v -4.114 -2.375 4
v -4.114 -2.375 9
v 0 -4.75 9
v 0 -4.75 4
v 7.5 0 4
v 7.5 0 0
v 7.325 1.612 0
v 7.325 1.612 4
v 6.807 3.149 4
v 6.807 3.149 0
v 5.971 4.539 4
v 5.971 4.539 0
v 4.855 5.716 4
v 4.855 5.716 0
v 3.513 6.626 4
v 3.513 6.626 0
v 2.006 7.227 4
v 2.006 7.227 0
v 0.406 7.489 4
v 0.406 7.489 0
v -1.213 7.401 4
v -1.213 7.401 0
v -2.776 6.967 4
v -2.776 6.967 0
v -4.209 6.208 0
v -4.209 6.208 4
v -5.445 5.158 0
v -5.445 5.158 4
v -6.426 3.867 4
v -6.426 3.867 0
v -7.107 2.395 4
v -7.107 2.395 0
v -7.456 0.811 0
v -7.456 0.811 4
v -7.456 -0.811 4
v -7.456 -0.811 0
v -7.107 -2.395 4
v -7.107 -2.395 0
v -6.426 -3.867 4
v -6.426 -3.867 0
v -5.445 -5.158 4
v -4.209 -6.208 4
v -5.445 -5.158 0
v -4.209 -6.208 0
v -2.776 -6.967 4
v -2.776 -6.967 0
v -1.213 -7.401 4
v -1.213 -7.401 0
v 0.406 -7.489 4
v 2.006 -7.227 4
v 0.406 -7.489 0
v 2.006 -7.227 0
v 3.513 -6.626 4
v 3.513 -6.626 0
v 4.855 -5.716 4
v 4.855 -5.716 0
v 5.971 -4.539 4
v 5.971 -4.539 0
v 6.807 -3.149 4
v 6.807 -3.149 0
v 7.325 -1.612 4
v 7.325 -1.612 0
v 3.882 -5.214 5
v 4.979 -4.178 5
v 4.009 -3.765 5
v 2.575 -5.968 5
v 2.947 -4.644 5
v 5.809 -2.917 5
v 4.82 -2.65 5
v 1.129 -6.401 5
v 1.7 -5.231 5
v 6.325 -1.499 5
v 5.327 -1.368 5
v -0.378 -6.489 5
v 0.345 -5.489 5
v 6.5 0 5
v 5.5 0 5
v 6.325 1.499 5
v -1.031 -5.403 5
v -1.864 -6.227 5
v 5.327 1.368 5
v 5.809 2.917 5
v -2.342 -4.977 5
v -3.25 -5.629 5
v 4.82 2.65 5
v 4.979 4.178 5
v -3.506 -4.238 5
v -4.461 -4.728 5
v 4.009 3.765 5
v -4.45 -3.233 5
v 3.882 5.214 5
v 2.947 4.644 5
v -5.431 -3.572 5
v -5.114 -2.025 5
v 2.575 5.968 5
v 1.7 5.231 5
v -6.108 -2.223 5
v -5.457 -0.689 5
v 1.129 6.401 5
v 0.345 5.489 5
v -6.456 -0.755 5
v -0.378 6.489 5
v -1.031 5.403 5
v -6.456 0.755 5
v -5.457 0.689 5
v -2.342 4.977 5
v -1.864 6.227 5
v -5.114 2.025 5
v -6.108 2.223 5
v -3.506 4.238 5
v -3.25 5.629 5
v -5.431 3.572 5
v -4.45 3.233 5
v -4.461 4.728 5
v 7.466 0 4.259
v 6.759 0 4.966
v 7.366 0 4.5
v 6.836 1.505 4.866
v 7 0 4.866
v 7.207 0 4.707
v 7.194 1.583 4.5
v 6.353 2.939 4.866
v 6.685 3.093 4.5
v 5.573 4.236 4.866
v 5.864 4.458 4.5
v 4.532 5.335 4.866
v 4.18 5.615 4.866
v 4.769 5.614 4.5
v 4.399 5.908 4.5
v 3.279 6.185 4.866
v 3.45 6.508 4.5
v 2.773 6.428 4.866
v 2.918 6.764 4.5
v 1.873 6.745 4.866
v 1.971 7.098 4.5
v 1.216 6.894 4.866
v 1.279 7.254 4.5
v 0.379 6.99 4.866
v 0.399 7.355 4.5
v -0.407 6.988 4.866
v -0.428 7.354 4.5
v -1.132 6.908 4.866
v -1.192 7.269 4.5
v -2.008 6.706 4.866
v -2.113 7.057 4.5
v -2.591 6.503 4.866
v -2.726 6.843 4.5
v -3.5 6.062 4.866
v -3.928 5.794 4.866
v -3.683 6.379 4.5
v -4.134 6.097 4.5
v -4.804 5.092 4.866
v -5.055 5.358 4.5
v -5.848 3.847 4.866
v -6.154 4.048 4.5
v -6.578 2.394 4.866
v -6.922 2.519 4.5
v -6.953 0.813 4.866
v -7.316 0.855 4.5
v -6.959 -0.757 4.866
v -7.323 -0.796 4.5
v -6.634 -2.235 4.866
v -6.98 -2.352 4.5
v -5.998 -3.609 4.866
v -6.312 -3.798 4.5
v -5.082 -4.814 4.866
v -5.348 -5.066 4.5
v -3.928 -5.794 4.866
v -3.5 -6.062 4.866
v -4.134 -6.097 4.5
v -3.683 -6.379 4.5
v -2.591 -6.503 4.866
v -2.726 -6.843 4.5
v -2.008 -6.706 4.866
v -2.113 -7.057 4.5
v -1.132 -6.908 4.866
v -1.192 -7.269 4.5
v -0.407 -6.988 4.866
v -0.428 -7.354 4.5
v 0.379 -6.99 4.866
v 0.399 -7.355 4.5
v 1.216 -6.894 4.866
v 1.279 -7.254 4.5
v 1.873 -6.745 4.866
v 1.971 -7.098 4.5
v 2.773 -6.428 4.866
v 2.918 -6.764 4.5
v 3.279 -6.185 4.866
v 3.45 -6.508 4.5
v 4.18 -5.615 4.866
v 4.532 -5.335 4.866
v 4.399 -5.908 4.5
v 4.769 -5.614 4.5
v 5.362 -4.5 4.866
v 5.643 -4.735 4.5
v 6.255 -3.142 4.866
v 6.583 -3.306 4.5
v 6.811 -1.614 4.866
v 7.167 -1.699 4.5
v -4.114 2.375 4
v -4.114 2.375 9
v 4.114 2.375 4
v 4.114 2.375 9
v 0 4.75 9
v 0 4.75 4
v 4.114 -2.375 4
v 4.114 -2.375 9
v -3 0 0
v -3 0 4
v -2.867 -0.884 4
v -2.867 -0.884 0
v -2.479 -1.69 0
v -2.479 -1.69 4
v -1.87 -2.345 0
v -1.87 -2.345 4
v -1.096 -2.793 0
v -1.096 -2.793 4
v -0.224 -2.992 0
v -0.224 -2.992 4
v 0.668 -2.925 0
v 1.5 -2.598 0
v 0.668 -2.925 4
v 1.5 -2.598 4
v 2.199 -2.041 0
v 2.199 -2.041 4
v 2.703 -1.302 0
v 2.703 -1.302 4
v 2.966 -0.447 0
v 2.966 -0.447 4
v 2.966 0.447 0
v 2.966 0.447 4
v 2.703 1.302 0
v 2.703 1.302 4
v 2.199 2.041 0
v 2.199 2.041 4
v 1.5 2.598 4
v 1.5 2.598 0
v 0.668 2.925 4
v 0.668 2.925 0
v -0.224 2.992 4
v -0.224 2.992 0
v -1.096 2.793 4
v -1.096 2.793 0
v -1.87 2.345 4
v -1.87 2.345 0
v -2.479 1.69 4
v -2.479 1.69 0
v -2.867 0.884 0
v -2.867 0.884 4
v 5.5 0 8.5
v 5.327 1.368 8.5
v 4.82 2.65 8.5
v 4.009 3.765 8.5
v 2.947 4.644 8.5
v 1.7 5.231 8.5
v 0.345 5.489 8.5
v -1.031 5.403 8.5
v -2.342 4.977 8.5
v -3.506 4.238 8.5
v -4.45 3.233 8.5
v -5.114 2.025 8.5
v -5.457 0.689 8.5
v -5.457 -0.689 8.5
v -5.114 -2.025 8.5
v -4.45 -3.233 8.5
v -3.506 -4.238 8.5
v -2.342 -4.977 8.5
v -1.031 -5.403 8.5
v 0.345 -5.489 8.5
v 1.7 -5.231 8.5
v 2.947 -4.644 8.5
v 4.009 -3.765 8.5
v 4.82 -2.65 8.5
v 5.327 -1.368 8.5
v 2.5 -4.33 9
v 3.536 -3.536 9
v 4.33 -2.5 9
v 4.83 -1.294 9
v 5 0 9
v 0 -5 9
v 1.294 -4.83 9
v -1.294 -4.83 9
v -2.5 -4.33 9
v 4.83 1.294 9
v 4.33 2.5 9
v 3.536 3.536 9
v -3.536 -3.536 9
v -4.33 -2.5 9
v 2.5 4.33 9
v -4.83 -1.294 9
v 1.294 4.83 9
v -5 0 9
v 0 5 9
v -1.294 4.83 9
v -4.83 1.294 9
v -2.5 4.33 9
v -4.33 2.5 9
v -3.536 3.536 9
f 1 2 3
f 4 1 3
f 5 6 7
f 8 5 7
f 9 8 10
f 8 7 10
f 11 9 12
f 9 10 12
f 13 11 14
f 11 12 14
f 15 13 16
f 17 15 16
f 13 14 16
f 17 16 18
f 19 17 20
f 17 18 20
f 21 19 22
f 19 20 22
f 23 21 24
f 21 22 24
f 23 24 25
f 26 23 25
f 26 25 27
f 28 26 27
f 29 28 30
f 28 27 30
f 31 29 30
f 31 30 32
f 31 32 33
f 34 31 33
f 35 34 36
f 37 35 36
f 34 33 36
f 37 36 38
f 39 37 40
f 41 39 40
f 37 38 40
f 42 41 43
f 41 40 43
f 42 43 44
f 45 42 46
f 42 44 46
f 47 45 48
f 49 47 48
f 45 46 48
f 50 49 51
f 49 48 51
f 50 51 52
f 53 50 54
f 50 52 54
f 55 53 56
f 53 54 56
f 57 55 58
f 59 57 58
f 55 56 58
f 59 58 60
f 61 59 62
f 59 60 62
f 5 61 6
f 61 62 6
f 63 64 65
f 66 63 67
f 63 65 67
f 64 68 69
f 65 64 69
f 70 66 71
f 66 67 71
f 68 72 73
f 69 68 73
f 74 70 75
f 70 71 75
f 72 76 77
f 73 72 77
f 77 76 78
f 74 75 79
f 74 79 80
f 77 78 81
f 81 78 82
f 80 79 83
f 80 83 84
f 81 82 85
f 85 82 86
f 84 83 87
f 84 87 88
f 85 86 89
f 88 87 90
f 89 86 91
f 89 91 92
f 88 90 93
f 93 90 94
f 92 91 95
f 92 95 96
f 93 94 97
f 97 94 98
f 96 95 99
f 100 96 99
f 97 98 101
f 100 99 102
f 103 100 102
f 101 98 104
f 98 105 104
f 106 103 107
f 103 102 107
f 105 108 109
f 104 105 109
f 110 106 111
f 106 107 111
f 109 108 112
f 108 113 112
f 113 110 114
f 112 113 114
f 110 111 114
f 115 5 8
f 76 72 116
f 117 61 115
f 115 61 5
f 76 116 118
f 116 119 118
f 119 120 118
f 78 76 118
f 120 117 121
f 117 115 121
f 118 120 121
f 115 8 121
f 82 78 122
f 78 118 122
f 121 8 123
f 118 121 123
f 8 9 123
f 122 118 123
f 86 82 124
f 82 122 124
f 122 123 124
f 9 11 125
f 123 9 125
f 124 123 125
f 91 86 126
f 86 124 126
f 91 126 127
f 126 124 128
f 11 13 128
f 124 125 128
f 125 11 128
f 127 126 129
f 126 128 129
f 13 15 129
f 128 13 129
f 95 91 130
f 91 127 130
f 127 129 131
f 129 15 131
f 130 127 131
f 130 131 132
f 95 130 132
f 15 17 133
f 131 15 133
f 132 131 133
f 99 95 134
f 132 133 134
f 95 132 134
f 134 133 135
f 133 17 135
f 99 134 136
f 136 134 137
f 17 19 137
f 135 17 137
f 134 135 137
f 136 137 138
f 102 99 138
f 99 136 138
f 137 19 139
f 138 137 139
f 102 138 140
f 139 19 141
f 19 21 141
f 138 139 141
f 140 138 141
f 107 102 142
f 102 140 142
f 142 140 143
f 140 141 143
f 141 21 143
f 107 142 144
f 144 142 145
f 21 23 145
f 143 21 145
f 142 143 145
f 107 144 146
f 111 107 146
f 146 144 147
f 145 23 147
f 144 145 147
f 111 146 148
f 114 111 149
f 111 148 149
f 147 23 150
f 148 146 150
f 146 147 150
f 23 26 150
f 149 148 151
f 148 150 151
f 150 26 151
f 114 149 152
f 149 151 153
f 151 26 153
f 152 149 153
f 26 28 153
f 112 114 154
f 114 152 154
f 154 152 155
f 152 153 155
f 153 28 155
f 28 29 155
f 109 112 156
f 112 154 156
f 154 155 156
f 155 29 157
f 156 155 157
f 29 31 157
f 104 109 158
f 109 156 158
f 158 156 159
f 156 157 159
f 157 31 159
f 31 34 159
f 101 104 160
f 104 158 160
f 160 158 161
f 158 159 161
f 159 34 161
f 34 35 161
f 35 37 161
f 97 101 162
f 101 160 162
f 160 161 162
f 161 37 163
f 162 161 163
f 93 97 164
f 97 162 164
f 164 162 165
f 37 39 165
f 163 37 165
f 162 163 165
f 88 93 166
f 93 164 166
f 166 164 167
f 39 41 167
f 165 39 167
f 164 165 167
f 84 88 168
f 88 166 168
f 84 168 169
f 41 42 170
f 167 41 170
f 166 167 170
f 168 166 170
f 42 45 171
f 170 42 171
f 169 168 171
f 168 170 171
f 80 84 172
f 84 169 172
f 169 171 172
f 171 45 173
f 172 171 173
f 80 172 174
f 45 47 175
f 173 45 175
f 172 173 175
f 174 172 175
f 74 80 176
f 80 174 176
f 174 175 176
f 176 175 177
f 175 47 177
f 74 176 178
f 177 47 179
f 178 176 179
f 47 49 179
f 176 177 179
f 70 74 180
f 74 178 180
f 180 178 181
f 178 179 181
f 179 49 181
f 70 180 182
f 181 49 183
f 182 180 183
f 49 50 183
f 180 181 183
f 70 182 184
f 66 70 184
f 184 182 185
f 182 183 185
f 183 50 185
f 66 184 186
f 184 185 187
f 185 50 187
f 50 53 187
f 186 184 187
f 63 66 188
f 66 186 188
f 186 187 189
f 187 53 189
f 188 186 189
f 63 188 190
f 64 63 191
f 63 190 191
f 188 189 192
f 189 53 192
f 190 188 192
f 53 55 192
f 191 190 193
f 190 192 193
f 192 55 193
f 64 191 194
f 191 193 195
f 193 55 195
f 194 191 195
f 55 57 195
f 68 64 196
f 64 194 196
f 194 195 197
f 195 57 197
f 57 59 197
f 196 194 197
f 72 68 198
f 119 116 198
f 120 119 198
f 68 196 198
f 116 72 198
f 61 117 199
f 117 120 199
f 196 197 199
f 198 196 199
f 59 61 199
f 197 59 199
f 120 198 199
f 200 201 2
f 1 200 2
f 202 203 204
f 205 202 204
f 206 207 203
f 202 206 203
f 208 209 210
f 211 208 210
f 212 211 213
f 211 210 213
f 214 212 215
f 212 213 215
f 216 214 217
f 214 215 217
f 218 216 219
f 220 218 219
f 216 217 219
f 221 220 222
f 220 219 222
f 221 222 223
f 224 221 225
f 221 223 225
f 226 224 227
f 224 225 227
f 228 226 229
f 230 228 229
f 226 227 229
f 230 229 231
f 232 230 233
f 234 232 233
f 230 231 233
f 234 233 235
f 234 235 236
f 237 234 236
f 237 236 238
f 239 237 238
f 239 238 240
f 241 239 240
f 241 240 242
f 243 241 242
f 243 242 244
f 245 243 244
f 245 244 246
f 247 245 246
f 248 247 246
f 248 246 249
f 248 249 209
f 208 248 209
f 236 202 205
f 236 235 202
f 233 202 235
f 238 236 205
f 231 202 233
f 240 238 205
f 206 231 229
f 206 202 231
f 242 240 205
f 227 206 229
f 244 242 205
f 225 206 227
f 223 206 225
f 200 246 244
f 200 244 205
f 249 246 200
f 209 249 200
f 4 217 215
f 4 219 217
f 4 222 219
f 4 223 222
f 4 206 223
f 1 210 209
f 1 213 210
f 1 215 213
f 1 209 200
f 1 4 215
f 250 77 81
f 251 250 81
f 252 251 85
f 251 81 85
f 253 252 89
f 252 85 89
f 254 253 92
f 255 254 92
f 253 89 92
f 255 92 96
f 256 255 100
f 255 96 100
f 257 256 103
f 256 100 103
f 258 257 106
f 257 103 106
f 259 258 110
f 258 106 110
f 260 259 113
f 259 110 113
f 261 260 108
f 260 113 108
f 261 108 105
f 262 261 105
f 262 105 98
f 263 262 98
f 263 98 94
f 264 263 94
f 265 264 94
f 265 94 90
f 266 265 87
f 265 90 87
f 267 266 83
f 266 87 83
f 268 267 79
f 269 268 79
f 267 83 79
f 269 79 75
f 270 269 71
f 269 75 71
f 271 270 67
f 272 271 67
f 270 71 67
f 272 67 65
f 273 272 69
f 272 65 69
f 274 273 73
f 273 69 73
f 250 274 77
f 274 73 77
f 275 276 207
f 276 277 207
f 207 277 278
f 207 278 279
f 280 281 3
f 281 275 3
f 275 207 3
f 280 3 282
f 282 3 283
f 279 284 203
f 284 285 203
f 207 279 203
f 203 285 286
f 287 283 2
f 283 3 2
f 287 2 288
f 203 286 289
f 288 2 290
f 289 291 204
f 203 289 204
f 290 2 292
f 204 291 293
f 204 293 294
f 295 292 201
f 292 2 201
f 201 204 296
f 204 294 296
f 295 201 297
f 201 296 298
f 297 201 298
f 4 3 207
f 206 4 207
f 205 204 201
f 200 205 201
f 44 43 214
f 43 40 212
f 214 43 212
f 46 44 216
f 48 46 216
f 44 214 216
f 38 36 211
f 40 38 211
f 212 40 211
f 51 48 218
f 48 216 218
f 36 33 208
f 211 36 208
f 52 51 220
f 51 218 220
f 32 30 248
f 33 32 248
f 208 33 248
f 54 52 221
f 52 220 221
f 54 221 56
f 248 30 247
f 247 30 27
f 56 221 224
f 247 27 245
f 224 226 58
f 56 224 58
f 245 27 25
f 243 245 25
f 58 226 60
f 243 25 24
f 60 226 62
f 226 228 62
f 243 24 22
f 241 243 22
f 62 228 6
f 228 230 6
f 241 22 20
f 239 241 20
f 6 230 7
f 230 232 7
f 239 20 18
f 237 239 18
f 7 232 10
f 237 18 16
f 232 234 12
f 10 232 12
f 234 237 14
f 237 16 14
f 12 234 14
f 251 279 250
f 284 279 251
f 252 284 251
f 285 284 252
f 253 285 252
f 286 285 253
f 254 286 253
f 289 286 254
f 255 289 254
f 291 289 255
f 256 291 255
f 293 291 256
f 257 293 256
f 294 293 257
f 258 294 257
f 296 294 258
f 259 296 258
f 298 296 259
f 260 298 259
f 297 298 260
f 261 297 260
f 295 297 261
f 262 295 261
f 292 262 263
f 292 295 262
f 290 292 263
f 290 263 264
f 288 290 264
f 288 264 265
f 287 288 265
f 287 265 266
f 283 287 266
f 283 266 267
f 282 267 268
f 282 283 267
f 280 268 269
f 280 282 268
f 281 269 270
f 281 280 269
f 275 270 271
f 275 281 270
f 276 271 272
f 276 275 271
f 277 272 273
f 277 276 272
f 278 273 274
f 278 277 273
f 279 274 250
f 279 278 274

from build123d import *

# Parameters (mm, degrees)
SKETCH001_R     = 3
POCKET_DEPTH    = 9.001
POCKET001_DEPTH = 5
FILLET_R        = 1
CHAMFER_SIZE    = 0.5


with BuildPart() as part:
    # Sketch → Revolution (revolve)
    with BuildSketch(Plane.XZ):
        Polygon((0, 0), (0, 9), (5.5, 9), (5.5, 5), (7.5, 5), (7.5, 0), align=None)
    revolve(axis=Axis((0, 0, 0), (0, 0, 1)))

    # Sketch001 (on Face1 of Revolution) → Pocket (cut, through all)
    with BuildSketch(Plane(origin=(0, 0, 9), x_dir=(-1, 0, 0), z_dir=(0, 0, 1))):
        Circle(SKETCH001_R)
    extrude(amount=-POCKET_DEPTH, mode=Mode.SUBTRACT)

    # Sketch002 (on Face1 of Pocket) → Pocket001 (cut)
    with BuildSketch(Plane(origin=(0, 0, 9), x_dir=(-1, 0, 0), z_dir=(0, 0, 1))):
        Polygon((4.113621, 2.375), (0, 4.75), (-4.113621, 2.375), (-4.113621, -2.375), (0, -4.75), (4.113621, -2.375), align=None)
    extrude(amount=-POCKET001_DEPTH, mode=Mode.SUBTRACT)

    # Fillet
    fillet_edges = [part.edges().sort_by_distance(p)[0] for p in [
        (-7.5, 0, 5),
    ]]
    fillet(fillet_edges, radius=FILLET_R)

    # Chamfer
    chamfer_edges = [part.edges().sort_by_distance(p)[0] for p in [
        (-5.5, 0, 9),
    ]]
    chamfer(chamfer_edges, length=CHAMFER_SIZE)


solid = part.part
